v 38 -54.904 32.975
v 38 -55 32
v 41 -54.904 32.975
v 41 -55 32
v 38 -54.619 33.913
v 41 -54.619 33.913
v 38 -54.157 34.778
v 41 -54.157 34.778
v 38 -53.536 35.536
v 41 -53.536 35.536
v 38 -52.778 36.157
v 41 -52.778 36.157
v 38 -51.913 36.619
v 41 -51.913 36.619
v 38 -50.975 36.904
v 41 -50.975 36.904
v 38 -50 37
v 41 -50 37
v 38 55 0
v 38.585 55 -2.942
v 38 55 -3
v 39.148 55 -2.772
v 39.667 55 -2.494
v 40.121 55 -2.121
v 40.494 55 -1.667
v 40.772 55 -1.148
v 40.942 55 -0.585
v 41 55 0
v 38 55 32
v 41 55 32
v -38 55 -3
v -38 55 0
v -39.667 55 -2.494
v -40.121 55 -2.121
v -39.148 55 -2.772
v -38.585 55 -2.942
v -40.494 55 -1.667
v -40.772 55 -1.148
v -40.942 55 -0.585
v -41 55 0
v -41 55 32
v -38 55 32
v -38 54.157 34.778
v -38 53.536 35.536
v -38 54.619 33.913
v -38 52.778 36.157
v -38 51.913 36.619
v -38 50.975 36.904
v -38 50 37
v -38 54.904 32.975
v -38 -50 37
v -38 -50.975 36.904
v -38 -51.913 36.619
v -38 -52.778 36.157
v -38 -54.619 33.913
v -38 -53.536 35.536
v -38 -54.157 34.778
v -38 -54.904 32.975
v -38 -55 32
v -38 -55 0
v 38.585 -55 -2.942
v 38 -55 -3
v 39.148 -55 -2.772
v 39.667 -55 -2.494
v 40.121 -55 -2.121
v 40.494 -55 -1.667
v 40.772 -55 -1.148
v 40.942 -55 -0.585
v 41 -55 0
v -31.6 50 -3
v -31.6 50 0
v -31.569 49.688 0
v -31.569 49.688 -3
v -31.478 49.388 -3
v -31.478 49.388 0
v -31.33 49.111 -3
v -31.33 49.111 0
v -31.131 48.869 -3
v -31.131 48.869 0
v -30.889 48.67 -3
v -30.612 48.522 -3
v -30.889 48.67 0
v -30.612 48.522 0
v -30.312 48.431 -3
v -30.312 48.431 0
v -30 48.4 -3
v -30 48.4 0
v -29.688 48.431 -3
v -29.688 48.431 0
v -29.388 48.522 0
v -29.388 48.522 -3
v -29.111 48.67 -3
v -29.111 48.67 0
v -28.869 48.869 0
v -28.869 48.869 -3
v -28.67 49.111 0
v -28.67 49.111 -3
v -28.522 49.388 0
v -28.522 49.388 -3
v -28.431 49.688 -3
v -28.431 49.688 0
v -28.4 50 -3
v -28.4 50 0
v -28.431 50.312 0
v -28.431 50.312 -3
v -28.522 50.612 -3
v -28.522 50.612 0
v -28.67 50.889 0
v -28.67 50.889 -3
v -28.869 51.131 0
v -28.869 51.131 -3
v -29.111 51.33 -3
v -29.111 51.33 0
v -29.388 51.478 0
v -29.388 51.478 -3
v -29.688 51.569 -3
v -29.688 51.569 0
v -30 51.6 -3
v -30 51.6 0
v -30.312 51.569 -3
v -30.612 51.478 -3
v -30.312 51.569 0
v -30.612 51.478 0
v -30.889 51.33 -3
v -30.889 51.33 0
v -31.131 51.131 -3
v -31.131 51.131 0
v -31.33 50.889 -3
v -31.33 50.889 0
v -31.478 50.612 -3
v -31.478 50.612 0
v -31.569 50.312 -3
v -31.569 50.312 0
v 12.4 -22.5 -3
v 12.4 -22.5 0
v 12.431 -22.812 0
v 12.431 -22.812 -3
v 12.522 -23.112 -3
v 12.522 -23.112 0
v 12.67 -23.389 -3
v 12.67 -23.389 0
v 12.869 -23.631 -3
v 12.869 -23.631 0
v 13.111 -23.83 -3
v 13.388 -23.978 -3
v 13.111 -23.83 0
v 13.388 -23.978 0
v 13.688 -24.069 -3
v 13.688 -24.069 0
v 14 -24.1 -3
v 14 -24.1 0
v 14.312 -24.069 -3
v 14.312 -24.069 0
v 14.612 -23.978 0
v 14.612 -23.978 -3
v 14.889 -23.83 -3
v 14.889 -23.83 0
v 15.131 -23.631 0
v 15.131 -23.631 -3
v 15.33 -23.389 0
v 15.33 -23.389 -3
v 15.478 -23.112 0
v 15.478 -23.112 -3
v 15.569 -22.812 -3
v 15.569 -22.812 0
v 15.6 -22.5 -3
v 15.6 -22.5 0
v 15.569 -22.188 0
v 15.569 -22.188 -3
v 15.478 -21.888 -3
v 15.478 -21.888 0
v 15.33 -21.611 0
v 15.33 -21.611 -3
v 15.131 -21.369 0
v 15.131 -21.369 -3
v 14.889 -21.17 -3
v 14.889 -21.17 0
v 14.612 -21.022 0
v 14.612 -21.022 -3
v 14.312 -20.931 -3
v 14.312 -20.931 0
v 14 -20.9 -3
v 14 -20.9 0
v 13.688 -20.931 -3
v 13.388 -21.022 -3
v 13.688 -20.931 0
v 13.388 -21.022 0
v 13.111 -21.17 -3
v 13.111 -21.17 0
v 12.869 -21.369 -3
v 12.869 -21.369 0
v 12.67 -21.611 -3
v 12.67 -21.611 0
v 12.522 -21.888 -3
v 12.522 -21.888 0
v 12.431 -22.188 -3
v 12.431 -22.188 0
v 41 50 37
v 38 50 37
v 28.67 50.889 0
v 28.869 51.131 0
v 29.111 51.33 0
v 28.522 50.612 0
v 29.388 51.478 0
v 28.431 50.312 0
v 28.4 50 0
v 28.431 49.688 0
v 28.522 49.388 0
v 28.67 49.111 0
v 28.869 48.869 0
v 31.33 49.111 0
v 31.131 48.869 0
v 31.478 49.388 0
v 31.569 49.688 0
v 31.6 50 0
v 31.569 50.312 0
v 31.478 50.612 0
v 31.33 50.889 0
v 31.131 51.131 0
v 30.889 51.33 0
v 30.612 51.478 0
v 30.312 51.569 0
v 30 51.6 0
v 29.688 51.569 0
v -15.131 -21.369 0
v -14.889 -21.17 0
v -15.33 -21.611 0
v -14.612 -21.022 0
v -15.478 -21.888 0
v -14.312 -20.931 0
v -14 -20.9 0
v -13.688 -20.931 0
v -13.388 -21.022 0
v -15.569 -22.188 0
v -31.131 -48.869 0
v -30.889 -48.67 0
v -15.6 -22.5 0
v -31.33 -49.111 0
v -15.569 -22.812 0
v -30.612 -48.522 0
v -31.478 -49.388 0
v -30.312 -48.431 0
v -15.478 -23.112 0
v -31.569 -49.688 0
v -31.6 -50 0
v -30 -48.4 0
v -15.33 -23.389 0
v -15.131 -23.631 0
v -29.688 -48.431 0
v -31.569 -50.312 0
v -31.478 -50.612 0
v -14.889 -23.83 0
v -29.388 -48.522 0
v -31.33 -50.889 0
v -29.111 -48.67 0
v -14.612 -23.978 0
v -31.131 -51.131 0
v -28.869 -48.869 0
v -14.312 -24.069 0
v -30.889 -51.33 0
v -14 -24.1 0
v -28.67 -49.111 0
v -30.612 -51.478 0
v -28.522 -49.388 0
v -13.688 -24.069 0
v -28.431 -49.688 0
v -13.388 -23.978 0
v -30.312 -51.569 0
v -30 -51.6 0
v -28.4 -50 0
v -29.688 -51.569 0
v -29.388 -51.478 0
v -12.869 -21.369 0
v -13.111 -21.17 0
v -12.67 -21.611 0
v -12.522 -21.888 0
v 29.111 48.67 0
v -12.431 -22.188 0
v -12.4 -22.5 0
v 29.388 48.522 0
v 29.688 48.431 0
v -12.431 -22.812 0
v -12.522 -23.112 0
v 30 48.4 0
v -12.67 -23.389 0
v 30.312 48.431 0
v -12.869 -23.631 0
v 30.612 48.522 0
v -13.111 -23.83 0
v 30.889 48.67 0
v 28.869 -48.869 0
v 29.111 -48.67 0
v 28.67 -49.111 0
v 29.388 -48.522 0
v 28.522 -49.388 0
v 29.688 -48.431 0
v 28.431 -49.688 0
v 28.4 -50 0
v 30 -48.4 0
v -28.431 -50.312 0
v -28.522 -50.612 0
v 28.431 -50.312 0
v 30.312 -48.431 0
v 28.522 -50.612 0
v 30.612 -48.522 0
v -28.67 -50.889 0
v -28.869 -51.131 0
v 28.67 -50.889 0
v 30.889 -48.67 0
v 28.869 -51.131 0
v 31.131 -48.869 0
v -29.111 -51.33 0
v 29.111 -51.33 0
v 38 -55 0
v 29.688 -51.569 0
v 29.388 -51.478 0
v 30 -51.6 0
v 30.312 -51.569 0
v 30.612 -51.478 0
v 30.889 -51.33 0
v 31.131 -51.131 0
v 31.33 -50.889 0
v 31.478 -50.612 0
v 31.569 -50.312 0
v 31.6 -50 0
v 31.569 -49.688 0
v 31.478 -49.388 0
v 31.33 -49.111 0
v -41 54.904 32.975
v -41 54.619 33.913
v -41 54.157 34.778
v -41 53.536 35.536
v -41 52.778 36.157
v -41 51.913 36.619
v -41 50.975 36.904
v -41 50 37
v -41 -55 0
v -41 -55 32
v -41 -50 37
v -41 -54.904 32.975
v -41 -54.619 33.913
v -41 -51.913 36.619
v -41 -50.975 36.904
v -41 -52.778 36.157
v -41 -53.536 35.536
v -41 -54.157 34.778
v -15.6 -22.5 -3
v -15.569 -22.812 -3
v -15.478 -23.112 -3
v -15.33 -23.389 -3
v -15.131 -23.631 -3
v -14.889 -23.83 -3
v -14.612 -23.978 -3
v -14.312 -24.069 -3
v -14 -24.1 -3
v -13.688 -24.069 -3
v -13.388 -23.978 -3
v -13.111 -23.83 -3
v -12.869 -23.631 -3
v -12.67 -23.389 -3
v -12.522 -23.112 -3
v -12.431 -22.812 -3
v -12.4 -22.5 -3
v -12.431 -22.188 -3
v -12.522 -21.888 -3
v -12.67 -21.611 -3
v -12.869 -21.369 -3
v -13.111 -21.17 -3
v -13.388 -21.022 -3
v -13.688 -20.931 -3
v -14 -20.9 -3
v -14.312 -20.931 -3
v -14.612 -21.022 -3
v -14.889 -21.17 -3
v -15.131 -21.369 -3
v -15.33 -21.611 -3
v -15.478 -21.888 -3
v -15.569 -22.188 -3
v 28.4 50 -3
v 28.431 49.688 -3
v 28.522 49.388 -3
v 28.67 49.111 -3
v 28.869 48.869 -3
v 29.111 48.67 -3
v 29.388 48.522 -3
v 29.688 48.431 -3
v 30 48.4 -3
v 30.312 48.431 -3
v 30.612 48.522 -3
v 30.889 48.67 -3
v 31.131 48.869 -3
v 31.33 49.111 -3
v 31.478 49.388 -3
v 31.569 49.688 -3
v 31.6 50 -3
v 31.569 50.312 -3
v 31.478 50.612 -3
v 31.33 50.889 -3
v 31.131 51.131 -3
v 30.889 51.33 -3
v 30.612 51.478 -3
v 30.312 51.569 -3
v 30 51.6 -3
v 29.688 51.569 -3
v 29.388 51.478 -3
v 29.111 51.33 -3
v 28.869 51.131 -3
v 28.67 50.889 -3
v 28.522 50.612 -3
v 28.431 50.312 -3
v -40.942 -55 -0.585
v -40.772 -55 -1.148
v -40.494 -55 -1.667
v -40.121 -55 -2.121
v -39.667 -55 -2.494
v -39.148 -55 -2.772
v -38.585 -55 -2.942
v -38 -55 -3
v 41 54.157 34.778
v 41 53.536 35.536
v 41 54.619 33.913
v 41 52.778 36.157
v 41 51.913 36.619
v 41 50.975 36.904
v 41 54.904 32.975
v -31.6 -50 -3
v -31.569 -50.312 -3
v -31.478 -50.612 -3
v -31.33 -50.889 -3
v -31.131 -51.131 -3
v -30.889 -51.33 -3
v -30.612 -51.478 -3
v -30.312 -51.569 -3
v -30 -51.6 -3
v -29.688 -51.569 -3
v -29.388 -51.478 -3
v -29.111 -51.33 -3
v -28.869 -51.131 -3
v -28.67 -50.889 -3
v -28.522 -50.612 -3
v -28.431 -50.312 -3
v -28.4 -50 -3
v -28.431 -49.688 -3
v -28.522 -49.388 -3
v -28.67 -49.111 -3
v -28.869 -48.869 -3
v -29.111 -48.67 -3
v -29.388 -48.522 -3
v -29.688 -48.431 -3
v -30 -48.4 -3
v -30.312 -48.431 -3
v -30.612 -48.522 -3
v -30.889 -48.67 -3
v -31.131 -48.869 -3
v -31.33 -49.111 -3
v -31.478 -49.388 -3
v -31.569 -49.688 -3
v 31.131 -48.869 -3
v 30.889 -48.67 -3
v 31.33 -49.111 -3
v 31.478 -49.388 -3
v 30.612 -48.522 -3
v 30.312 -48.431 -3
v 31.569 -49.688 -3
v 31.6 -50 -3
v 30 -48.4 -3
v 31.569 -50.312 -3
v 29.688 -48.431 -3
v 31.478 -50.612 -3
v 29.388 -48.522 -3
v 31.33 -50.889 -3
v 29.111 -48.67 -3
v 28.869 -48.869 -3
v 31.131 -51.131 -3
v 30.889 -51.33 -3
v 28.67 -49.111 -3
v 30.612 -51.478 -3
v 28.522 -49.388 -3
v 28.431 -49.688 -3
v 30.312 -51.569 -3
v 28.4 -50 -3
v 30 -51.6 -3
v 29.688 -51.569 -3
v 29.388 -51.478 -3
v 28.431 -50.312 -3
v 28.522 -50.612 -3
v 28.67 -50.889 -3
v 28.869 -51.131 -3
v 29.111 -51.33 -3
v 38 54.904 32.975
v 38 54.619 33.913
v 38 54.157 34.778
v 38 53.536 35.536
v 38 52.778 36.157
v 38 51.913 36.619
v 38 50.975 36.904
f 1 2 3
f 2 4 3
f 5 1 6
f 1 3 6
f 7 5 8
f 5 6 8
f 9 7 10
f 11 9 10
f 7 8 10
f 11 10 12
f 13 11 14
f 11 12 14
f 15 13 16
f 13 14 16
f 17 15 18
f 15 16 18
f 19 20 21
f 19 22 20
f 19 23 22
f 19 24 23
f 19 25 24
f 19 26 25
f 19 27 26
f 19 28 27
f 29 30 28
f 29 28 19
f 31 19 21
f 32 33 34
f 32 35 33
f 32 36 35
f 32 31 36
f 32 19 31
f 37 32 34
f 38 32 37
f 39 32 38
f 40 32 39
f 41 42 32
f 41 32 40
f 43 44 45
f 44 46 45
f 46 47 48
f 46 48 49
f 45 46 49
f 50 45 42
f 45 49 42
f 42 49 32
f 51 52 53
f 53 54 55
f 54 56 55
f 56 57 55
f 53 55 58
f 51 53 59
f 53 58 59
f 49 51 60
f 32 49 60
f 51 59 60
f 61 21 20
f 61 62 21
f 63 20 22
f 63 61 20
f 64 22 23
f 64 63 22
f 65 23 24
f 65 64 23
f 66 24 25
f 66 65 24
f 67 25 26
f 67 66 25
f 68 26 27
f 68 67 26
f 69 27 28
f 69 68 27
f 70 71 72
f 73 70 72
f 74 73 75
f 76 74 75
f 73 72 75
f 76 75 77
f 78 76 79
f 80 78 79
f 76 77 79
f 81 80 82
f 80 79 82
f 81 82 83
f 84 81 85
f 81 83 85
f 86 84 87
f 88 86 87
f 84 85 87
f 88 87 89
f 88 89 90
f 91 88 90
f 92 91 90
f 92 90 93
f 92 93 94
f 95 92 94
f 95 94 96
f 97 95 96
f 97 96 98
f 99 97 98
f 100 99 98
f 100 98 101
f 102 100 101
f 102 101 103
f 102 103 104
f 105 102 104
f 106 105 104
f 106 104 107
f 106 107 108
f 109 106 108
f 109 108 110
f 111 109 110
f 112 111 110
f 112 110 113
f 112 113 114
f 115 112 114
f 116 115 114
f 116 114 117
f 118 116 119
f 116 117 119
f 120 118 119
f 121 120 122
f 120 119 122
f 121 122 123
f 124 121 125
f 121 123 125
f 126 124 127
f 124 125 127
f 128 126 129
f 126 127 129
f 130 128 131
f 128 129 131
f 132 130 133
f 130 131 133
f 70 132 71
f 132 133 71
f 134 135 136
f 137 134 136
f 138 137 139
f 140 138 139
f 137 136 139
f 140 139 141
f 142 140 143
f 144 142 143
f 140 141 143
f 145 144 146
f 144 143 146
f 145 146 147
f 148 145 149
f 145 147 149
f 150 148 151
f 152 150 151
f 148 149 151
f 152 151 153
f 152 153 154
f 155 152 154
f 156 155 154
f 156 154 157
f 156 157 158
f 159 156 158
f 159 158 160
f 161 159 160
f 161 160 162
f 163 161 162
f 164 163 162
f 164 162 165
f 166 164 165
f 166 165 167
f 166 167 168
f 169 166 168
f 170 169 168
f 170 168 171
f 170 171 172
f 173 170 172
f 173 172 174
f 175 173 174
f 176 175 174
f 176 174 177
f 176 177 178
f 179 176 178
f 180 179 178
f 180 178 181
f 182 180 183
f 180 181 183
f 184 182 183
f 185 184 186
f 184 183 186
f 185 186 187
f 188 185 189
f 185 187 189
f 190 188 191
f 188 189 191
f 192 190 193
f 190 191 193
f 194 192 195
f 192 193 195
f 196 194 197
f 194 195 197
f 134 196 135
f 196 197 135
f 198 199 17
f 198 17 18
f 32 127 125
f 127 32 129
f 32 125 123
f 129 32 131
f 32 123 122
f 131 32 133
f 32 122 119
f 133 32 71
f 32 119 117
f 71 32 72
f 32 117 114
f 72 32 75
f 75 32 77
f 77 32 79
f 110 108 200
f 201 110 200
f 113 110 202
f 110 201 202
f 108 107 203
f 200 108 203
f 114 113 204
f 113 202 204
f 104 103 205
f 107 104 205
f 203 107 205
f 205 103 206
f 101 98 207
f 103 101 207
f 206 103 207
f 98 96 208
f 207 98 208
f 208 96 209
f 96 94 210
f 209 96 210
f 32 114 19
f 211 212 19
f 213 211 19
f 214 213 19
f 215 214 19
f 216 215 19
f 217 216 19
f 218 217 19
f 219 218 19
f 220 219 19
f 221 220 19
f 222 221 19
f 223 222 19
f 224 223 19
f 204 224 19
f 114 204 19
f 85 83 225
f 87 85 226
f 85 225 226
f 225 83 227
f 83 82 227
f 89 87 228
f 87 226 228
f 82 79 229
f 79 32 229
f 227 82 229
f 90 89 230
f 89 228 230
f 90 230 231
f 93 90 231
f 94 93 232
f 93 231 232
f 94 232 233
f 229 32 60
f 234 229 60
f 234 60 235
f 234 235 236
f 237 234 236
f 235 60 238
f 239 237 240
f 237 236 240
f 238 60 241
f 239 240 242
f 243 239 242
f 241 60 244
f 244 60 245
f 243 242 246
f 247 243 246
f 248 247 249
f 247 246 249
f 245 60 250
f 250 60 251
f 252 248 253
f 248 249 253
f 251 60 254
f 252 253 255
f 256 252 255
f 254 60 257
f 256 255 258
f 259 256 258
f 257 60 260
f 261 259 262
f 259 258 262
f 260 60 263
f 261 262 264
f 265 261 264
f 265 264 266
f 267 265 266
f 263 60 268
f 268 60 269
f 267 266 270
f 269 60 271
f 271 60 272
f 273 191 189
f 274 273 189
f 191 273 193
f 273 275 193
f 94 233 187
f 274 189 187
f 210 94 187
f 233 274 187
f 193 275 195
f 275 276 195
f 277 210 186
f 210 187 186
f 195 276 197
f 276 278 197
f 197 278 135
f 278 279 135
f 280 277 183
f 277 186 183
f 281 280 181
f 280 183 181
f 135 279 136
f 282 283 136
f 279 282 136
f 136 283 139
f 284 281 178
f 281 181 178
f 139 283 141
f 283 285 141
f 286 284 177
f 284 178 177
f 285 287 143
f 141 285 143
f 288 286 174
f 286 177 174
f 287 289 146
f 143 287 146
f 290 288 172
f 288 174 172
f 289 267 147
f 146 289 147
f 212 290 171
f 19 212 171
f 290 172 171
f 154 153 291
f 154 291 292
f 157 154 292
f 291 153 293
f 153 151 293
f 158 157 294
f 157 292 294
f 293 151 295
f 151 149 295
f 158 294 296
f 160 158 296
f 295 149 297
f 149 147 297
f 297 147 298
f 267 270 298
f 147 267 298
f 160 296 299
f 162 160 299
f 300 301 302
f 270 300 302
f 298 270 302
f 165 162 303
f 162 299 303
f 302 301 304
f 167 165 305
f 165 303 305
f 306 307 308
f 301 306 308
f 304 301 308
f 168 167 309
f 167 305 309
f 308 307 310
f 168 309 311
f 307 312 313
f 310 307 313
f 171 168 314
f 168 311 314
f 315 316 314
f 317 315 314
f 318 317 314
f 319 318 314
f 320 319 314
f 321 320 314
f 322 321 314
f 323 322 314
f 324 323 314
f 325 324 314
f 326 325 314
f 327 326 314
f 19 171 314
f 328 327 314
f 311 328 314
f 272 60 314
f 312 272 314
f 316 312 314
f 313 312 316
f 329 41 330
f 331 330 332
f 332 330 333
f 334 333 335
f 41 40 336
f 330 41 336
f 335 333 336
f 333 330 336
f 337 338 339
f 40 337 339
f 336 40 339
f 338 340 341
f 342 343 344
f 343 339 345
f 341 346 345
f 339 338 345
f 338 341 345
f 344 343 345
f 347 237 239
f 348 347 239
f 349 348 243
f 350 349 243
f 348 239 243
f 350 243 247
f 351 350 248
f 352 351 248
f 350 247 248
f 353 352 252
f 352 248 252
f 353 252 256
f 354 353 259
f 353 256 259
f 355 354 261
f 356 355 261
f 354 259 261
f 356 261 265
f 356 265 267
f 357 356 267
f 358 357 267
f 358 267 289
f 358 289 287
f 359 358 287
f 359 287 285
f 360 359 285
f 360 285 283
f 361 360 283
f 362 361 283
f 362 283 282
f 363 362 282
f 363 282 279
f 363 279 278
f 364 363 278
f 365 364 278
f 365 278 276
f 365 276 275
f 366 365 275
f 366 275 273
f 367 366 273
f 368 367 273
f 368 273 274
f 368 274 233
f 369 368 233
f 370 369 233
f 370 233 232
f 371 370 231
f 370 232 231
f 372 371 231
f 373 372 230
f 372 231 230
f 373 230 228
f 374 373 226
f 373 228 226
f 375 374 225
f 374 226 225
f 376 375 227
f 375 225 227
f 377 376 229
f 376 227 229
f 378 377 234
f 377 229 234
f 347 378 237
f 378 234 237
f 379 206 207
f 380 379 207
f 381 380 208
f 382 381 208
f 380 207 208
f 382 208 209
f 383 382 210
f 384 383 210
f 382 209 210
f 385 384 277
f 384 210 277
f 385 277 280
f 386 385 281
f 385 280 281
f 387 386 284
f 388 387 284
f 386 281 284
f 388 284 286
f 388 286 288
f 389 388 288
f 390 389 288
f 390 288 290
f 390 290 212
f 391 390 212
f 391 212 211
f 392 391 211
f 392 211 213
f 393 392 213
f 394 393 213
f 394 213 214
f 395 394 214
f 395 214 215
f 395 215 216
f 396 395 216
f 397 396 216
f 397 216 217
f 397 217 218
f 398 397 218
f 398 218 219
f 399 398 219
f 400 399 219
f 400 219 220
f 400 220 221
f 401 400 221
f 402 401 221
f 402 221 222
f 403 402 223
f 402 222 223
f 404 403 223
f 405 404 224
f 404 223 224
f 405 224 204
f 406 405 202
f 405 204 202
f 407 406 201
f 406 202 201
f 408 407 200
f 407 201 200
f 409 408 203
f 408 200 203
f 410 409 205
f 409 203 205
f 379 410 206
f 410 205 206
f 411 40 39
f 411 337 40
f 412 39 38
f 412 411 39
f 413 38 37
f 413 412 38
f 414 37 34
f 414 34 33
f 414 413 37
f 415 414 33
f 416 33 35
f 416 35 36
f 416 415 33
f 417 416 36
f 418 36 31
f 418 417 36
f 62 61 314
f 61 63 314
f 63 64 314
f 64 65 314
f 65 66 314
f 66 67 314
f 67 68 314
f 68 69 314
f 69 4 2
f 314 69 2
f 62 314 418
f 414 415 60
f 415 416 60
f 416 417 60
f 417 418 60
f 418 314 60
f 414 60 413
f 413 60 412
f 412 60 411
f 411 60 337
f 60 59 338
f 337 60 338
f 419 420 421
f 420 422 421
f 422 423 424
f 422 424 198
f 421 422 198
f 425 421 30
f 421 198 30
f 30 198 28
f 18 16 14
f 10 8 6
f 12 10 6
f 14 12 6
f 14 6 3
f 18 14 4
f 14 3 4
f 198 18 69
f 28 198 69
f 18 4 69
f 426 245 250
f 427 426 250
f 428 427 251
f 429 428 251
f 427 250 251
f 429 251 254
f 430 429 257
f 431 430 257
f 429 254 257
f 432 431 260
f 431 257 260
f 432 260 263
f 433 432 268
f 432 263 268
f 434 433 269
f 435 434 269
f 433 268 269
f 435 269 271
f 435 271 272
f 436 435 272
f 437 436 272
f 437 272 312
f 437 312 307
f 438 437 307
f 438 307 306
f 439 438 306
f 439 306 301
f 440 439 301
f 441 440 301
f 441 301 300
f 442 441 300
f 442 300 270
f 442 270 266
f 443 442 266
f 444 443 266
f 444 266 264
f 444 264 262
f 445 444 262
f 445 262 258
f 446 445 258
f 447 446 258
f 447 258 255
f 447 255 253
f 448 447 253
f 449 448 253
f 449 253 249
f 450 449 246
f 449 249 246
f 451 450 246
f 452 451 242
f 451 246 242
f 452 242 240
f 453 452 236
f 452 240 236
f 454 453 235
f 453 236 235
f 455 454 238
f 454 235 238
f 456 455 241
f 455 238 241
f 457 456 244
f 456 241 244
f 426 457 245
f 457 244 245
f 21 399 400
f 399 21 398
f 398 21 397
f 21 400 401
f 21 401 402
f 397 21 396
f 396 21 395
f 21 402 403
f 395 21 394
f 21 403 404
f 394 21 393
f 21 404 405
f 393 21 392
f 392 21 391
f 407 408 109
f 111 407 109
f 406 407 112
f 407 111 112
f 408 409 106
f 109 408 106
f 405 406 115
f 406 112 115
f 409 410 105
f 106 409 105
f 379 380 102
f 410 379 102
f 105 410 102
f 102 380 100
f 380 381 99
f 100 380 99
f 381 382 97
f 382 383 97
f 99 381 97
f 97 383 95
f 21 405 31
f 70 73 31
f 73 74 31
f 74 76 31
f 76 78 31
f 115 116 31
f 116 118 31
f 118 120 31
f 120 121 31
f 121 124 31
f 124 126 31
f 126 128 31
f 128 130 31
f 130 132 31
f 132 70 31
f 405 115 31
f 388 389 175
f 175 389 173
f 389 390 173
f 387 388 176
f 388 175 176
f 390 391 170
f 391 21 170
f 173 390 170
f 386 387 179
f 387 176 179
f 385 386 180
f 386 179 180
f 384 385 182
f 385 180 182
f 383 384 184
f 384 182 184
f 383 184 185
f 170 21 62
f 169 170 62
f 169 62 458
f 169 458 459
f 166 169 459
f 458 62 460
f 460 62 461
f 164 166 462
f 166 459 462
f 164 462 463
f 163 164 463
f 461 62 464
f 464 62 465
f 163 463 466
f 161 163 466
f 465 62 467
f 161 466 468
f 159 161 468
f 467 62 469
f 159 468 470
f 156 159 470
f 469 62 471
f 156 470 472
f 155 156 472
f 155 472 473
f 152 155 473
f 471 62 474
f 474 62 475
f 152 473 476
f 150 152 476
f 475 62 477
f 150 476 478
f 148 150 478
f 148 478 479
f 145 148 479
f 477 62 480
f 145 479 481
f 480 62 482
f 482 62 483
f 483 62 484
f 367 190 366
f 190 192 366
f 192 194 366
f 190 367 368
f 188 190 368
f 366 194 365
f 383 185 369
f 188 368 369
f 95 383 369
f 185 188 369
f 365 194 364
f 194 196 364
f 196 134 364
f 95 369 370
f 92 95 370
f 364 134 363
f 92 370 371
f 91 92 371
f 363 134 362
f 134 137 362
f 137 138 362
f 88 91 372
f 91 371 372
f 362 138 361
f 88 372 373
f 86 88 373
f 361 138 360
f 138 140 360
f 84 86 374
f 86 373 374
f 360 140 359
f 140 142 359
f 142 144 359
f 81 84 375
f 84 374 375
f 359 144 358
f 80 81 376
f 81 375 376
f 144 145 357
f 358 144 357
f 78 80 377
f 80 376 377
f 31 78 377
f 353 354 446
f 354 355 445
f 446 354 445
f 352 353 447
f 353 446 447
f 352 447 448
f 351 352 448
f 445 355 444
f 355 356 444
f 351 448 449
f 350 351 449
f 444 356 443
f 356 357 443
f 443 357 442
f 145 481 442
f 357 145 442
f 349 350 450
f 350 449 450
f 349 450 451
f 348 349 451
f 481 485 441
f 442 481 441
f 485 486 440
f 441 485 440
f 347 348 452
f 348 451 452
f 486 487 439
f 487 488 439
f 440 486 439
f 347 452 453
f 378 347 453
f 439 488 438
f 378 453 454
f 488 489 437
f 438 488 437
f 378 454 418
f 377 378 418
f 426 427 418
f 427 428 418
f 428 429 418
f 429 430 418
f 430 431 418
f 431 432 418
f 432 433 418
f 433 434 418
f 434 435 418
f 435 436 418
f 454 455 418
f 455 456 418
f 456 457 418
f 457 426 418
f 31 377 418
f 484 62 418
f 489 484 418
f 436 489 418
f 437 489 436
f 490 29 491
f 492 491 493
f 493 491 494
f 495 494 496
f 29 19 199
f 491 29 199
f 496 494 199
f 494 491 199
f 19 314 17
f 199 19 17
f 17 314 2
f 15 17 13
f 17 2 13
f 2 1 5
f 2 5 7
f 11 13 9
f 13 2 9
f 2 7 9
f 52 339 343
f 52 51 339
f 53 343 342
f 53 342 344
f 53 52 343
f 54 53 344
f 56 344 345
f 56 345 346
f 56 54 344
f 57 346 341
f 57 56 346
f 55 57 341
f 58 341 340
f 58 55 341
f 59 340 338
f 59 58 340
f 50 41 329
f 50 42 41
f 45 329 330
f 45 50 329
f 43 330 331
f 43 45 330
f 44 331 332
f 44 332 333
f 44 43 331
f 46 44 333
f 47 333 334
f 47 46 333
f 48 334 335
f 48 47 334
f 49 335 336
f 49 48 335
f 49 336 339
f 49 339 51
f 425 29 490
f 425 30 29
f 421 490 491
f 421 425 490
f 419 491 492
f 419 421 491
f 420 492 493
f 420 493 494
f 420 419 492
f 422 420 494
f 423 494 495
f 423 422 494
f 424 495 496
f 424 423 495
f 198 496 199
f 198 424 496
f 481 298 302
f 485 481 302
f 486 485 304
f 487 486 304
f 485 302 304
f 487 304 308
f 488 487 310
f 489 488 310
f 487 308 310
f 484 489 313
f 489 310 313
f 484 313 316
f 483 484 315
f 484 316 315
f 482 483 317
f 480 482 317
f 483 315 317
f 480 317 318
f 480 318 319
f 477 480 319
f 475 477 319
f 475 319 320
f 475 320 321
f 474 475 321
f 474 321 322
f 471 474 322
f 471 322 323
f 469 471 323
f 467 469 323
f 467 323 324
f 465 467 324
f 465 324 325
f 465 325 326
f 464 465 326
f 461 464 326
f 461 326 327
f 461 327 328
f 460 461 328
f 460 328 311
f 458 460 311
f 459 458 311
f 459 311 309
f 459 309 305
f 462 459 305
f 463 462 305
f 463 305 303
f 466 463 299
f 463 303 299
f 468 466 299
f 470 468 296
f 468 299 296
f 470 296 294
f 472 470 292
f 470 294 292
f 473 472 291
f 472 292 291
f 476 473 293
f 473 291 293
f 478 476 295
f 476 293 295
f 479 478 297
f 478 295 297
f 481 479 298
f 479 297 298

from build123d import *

# Parameters (mm, degrees)
PAD_DEPTH    = 55
SKETCH001_R  = 1.6
POCKET_DEPTH = 3.001
FILLET_R     = 3
FILLET001_R  = 5


with BuildPart() as part:
    # Sketch → Pad (new body, symmetric)
    with BuildSketch(Plane.XZ):
        Polygon((-41, -3), (-41, 37), (-38, 37), (-38, 0), (38, 0), (38, 37), (41, 37), (41, -3), align=None)
    extrude(amount=PAD_DEPTH, both=True)

    # Sketch001 (on Face4 of Pad) → Pocket (cut, through all)
    with BuildSketch(Plane(origin=(0, 0, 0), x_dir=(-1, 0, 0), z_dir=(0, 0, 1))):
        with Locations((-30, 50)):
            Circle(SKETCH001_R)
        with Locations((30, 50)):
            Circle(SKETCH001_R)
        with Locations((-30, -50)):
            Circle(SKETCH001_R)
        with Locations((30, -50)):
            Circle(SKETCH001_R)
        with Locations((-14, 22.5)):
            Circle(SKETCH001_R)
        with Locations((14, 22.5)):
            Circle(SKETCH001_R)
    extrude(amount=-POCKET_DEPTH, mode=Mode.SUBTRACT)

    # Fillet
    fillet_edges = [part.edges().sort_by_distance(p)[0] for p in [
        (-41, 0, -3),
        (41, 0, -3),
    ]]
    fillet(fillet_edges, radius=FILLET_R)

    # Fillet001
    fillet001_edges = [part.edges().sort_by_distance(p)[0] for p in [
        (39.5, -55, 37),
        (-39.5, -55, 37),
        (-39.5, 55, 37),
        (39.5, 55, 37),
    ]]
    fillet(fillet001_edges, radius=FILLET001_R)


solid = part.part
